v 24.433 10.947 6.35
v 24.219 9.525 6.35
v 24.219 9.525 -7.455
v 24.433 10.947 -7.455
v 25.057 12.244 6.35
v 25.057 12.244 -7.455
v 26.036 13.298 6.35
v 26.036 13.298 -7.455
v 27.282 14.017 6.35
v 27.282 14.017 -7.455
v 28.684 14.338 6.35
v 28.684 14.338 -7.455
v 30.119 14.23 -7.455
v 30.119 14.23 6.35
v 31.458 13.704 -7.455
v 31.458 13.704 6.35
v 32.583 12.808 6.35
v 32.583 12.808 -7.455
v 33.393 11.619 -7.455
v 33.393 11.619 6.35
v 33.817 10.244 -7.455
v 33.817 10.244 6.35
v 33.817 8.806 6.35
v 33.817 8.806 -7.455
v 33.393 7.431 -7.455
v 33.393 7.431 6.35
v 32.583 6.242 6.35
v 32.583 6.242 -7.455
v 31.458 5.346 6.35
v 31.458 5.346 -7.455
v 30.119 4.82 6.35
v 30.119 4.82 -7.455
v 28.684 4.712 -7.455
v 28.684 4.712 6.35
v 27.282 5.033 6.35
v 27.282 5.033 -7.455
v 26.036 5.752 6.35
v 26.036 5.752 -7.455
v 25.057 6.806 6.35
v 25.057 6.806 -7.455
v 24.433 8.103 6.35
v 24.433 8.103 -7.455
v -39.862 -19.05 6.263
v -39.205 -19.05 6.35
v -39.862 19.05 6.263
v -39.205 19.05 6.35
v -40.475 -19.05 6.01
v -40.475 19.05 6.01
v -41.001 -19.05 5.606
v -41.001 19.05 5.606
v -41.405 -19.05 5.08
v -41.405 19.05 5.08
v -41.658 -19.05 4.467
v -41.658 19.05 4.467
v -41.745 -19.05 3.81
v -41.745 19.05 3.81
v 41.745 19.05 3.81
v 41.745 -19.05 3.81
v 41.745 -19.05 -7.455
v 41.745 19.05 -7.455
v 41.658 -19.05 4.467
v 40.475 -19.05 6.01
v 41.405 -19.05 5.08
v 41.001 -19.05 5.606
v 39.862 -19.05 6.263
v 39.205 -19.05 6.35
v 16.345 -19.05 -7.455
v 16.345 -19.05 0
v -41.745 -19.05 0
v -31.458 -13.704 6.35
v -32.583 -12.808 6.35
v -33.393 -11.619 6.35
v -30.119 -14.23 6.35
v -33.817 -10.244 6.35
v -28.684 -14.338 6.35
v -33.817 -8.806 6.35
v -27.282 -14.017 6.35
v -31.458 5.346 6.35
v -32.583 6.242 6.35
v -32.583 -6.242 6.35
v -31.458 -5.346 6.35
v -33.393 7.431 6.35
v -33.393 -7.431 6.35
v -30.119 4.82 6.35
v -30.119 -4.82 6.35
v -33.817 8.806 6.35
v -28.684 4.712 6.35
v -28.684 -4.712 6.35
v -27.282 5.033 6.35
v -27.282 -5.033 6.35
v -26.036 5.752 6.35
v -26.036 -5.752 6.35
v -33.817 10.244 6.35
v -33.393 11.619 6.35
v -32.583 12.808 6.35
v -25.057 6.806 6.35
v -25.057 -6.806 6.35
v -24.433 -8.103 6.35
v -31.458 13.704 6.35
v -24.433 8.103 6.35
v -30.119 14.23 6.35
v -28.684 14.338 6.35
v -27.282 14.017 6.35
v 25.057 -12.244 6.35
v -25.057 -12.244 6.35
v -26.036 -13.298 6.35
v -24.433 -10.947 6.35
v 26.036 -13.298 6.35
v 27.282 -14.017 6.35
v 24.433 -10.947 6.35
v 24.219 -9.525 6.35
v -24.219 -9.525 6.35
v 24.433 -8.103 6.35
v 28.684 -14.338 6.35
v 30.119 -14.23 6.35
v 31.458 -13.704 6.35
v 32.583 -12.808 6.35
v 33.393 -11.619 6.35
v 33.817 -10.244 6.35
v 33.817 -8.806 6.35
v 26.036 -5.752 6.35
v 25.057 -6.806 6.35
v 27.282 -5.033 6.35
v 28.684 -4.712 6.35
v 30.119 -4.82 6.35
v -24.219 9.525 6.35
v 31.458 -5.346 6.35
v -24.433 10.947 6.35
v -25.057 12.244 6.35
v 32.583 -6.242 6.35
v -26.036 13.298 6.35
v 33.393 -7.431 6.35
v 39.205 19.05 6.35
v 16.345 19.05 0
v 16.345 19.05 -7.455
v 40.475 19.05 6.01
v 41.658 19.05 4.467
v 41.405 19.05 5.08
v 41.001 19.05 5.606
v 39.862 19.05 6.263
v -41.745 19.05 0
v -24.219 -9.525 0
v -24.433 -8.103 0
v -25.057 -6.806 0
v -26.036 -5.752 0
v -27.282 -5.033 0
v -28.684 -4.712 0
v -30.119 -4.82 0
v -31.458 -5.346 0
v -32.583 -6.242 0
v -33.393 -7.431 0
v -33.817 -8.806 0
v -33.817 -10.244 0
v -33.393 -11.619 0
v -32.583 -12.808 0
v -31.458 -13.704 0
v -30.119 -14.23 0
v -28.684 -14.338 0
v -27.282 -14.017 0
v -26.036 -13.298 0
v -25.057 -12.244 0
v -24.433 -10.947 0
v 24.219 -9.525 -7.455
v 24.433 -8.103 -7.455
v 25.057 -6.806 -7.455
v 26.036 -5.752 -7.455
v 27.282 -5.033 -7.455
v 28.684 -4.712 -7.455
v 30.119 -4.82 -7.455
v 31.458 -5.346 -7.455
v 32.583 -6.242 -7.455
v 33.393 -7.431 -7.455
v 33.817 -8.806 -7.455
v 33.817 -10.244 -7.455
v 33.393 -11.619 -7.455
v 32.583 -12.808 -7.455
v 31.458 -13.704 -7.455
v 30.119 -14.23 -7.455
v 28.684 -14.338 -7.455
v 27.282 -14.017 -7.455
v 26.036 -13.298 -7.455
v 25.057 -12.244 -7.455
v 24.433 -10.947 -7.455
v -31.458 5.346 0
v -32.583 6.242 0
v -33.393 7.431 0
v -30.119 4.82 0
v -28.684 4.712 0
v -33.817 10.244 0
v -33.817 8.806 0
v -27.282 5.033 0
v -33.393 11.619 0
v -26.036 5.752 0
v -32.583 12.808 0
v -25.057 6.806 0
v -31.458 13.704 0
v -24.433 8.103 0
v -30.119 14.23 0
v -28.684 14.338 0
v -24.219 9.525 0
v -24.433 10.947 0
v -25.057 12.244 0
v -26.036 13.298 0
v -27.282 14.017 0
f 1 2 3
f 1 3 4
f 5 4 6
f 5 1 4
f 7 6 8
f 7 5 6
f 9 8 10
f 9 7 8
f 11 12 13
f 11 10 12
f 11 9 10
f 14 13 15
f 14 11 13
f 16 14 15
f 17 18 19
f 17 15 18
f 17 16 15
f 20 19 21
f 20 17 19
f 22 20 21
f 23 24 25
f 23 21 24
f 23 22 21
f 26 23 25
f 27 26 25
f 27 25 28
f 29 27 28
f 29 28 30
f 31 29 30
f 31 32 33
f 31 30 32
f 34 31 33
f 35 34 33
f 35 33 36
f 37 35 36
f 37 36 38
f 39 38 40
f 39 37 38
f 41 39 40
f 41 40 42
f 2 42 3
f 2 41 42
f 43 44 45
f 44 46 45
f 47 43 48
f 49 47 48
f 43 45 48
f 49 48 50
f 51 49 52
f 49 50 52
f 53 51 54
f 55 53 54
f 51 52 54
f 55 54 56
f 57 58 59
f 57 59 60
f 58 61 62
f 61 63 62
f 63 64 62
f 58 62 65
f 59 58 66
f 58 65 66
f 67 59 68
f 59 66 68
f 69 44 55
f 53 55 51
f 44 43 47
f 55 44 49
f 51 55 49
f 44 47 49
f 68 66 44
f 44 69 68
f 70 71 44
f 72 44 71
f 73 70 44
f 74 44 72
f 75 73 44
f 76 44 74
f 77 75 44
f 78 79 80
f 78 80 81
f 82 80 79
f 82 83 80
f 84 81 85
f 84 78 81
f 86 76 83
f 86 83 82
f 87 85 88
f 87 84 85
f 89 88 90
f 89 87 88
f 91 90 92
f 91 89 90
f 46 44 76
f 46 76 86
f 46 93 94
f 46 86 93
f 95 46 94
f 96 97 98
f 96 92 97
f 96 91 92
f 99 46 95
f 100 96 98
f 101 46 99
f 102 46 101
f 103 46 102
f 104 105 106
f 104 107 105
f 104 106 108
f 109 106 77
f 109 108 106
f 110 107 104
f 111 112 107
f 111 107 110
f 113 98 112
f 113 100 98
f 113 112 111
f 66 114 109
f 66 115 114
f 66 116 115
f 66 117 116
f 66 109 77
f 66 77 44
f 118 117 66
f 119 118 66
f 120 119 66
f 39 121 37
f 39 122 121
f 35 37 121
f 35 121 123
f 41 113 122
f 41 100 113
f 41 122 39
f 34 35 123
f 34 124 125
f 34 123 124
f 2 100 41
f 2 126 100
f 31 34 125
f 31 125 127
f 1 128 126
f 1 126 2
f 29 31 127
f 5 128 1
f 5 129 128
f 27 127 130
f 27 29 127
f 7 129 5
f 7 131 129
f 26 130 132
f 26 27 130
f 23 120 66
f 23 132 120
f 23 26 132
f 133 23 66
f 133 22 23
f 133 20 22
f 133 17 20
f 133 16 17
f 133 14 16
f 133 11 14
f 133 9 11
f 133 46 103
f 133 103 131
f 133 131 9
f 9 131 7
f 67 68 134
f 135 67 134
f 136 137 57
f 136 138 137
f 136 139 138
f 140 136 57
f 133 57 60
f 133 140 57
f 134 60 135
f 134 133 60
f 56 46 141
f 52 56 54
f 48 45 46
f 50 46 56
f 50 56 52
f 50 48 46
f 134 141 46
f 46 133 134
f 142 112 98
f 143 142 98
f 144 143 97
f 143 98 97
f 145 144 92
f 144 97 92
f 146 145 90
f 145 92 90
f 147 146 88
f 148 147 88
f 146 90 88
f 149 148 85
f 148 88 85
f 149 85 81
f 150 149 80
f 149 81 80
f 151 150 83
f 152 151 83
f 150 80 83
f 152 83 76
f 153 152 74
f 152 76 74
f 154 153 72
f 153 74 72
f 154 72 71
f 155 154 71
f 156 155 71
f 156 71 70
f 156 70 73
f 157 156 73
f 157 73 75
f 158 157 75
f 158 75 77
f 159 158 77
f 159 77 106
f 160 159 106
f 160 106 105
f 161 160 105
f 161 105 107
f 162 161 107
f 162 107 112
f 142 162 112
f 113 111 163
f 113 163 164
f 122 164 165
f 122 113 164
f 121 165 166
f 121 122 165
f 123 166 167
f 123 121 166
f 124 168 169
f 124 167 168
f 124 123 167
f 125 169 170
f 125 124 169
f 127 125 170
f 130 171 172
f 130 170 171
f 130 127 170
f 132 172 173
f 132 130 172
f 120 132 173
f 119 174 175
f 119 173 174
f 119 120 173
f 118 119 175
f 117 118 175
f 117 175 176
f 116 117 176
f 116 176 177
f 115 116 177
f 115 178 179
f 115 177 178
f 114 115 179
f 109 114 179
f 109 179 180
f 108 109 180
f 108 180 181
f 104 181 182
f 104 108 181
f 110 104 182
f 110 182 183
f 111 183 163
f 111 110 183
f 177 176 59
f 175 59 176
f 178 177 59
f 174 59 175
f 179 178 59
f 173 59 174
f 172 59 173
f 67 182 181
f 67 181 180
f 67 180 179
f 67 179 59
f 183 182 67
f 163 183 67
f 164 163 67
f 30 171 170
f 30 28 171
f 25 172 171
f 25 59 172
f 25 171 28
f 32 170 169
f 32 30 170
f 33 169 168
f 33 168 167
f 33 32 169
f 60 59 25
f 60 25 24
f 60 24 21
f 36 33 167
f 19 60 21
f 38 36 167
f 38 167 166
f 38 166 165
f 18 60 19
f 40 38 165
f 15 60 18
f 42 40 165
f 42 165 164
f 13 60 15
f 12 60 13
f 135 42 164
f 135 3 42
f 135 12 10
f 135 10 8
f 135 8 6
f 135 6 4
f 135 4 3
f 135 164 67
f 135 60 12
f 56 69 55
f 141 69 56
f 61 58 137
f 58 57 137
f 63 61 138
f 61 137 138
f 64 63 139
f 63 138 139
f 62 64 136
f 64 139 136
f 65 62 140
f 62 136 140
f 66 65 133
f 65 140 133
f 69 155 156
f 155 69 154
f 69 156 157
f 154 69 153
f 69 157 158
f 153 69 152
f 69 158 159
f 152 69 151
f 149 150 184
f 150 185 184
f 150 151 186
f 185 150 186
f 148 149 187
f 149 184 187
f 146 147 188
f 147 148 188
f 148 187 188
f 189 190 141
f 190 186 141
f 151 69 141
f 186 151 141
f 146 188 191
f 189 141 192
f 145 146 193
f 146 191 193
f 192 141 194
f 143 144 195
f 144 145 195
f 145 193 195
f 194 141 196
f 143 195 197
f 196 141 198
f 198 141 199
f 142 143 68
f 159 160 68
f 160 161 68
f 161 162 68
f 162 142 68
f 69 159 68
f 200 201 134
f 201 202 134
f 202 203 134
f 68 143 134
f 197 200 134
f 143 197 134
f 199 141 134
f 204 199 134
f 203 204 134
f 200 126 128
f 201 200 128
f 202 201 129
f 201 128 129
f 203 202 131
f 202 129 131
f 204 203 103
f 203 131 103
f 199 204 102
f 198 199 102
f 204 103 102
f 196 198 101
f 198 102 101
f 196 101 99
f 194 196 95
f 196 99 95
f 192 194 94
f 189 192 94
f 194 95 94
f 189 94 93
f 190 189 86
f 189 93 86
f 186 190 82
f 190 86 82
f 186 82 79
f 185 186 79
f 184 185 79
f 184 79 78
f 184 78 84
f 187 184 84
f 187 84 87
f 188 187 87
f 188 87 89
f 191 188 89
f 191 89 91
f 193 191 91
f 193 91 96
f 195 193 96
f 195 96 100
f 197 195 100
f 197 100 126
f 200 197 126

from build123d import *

# Parameters (mm, degrees)
SKETCH1_W               = 83.4898
SKETCH1_H               = 38.1
BOSS_EXTRUDE1_DEPTH     = 6.35
SKETCH2_W               = 25.4
SKETCH2_H               = 38.1
BOSS_EXTRUDE2_DEPTH     = 7.4549
CUT_EXTRUDE1_DEPTH      = 48.917788347
CUT_EXTRUDE1_DEPTH_BACK = 48.917788347
SKETCH6_R               = 4.826
SKETCH8_R               = 4.826
CUT_EXTRUDE2_DEPTH      = 48.917788347
FILLET1_R               = 2.54


with BuildPart() as part:
    # Sketch1 → Boss-Extrude1 (new body)
    with BuildSketch(Plane.XY):
        Rectangle(SKETCH1_W, SKETCH1_H)
    extrude(amount=BOSS_EXTRUDE1_DEPTH)

    # Sketch2 → Boss-Extrude2 (add)
    with BuildSketch(Plane(origin=(0, 0, 0), x_dir=(-1, 0, 0), z_dir=(0, 0, -1))):
        with Locations((-29.0449, 0)):
            Rectangle(SKETCH2_W, SKETCH2_H)
    extrude(amount=BOSS_EXTRUDE2_DEPTH)

    # Sketch6 → Cut-Extrude1 (cut, two sides: drawn at the far end of the back side and taken through both)
    with BuildSketch(Plane(origin=(0, 0, -7.4549), x_dir=(-1, 0, 0), z_dir=(0, 0, -1)).offset(-CUT_EXTRUDE1_DEPTH_BACK)):
        with Locations((-29.0449, 9.525)):
            Circle(SKETCH6_R)
        with Locations((-29.0449, -9.525)):
            Circle(SKETCH6_R)
    extrude(amount=CUT_EXTRUDE1_DEPTH + CUT_EXTRUDE1_DEPTH_BACK, mode=Mode.SUBTRACT)

    # Sketch8 → Cut-Extrude2 (cut, through all)
    with BuildSketch(Plane.XY.offset(6.35)):
        with Locations((-29.0449, -9.525)):
            Circle(SKETCH8_R)
        with Locations((-29.0449, 9.525)):
            Circle(SKETCH8_R)
    extrude(amount=-CUT_EXTRUDE2_DEPTH, mode=Mode.SUBTRACT)

    # Fillet1
    fillet1_edges = [part.edges().sort_by_distance(p)[0] for p in [
        (-41.7449, 0, 6.35),
        (41.7449, 0, 6.35),
    ]]
    fillet(fillet1_edges, radius=FILLET1_R)


solid = part.part
